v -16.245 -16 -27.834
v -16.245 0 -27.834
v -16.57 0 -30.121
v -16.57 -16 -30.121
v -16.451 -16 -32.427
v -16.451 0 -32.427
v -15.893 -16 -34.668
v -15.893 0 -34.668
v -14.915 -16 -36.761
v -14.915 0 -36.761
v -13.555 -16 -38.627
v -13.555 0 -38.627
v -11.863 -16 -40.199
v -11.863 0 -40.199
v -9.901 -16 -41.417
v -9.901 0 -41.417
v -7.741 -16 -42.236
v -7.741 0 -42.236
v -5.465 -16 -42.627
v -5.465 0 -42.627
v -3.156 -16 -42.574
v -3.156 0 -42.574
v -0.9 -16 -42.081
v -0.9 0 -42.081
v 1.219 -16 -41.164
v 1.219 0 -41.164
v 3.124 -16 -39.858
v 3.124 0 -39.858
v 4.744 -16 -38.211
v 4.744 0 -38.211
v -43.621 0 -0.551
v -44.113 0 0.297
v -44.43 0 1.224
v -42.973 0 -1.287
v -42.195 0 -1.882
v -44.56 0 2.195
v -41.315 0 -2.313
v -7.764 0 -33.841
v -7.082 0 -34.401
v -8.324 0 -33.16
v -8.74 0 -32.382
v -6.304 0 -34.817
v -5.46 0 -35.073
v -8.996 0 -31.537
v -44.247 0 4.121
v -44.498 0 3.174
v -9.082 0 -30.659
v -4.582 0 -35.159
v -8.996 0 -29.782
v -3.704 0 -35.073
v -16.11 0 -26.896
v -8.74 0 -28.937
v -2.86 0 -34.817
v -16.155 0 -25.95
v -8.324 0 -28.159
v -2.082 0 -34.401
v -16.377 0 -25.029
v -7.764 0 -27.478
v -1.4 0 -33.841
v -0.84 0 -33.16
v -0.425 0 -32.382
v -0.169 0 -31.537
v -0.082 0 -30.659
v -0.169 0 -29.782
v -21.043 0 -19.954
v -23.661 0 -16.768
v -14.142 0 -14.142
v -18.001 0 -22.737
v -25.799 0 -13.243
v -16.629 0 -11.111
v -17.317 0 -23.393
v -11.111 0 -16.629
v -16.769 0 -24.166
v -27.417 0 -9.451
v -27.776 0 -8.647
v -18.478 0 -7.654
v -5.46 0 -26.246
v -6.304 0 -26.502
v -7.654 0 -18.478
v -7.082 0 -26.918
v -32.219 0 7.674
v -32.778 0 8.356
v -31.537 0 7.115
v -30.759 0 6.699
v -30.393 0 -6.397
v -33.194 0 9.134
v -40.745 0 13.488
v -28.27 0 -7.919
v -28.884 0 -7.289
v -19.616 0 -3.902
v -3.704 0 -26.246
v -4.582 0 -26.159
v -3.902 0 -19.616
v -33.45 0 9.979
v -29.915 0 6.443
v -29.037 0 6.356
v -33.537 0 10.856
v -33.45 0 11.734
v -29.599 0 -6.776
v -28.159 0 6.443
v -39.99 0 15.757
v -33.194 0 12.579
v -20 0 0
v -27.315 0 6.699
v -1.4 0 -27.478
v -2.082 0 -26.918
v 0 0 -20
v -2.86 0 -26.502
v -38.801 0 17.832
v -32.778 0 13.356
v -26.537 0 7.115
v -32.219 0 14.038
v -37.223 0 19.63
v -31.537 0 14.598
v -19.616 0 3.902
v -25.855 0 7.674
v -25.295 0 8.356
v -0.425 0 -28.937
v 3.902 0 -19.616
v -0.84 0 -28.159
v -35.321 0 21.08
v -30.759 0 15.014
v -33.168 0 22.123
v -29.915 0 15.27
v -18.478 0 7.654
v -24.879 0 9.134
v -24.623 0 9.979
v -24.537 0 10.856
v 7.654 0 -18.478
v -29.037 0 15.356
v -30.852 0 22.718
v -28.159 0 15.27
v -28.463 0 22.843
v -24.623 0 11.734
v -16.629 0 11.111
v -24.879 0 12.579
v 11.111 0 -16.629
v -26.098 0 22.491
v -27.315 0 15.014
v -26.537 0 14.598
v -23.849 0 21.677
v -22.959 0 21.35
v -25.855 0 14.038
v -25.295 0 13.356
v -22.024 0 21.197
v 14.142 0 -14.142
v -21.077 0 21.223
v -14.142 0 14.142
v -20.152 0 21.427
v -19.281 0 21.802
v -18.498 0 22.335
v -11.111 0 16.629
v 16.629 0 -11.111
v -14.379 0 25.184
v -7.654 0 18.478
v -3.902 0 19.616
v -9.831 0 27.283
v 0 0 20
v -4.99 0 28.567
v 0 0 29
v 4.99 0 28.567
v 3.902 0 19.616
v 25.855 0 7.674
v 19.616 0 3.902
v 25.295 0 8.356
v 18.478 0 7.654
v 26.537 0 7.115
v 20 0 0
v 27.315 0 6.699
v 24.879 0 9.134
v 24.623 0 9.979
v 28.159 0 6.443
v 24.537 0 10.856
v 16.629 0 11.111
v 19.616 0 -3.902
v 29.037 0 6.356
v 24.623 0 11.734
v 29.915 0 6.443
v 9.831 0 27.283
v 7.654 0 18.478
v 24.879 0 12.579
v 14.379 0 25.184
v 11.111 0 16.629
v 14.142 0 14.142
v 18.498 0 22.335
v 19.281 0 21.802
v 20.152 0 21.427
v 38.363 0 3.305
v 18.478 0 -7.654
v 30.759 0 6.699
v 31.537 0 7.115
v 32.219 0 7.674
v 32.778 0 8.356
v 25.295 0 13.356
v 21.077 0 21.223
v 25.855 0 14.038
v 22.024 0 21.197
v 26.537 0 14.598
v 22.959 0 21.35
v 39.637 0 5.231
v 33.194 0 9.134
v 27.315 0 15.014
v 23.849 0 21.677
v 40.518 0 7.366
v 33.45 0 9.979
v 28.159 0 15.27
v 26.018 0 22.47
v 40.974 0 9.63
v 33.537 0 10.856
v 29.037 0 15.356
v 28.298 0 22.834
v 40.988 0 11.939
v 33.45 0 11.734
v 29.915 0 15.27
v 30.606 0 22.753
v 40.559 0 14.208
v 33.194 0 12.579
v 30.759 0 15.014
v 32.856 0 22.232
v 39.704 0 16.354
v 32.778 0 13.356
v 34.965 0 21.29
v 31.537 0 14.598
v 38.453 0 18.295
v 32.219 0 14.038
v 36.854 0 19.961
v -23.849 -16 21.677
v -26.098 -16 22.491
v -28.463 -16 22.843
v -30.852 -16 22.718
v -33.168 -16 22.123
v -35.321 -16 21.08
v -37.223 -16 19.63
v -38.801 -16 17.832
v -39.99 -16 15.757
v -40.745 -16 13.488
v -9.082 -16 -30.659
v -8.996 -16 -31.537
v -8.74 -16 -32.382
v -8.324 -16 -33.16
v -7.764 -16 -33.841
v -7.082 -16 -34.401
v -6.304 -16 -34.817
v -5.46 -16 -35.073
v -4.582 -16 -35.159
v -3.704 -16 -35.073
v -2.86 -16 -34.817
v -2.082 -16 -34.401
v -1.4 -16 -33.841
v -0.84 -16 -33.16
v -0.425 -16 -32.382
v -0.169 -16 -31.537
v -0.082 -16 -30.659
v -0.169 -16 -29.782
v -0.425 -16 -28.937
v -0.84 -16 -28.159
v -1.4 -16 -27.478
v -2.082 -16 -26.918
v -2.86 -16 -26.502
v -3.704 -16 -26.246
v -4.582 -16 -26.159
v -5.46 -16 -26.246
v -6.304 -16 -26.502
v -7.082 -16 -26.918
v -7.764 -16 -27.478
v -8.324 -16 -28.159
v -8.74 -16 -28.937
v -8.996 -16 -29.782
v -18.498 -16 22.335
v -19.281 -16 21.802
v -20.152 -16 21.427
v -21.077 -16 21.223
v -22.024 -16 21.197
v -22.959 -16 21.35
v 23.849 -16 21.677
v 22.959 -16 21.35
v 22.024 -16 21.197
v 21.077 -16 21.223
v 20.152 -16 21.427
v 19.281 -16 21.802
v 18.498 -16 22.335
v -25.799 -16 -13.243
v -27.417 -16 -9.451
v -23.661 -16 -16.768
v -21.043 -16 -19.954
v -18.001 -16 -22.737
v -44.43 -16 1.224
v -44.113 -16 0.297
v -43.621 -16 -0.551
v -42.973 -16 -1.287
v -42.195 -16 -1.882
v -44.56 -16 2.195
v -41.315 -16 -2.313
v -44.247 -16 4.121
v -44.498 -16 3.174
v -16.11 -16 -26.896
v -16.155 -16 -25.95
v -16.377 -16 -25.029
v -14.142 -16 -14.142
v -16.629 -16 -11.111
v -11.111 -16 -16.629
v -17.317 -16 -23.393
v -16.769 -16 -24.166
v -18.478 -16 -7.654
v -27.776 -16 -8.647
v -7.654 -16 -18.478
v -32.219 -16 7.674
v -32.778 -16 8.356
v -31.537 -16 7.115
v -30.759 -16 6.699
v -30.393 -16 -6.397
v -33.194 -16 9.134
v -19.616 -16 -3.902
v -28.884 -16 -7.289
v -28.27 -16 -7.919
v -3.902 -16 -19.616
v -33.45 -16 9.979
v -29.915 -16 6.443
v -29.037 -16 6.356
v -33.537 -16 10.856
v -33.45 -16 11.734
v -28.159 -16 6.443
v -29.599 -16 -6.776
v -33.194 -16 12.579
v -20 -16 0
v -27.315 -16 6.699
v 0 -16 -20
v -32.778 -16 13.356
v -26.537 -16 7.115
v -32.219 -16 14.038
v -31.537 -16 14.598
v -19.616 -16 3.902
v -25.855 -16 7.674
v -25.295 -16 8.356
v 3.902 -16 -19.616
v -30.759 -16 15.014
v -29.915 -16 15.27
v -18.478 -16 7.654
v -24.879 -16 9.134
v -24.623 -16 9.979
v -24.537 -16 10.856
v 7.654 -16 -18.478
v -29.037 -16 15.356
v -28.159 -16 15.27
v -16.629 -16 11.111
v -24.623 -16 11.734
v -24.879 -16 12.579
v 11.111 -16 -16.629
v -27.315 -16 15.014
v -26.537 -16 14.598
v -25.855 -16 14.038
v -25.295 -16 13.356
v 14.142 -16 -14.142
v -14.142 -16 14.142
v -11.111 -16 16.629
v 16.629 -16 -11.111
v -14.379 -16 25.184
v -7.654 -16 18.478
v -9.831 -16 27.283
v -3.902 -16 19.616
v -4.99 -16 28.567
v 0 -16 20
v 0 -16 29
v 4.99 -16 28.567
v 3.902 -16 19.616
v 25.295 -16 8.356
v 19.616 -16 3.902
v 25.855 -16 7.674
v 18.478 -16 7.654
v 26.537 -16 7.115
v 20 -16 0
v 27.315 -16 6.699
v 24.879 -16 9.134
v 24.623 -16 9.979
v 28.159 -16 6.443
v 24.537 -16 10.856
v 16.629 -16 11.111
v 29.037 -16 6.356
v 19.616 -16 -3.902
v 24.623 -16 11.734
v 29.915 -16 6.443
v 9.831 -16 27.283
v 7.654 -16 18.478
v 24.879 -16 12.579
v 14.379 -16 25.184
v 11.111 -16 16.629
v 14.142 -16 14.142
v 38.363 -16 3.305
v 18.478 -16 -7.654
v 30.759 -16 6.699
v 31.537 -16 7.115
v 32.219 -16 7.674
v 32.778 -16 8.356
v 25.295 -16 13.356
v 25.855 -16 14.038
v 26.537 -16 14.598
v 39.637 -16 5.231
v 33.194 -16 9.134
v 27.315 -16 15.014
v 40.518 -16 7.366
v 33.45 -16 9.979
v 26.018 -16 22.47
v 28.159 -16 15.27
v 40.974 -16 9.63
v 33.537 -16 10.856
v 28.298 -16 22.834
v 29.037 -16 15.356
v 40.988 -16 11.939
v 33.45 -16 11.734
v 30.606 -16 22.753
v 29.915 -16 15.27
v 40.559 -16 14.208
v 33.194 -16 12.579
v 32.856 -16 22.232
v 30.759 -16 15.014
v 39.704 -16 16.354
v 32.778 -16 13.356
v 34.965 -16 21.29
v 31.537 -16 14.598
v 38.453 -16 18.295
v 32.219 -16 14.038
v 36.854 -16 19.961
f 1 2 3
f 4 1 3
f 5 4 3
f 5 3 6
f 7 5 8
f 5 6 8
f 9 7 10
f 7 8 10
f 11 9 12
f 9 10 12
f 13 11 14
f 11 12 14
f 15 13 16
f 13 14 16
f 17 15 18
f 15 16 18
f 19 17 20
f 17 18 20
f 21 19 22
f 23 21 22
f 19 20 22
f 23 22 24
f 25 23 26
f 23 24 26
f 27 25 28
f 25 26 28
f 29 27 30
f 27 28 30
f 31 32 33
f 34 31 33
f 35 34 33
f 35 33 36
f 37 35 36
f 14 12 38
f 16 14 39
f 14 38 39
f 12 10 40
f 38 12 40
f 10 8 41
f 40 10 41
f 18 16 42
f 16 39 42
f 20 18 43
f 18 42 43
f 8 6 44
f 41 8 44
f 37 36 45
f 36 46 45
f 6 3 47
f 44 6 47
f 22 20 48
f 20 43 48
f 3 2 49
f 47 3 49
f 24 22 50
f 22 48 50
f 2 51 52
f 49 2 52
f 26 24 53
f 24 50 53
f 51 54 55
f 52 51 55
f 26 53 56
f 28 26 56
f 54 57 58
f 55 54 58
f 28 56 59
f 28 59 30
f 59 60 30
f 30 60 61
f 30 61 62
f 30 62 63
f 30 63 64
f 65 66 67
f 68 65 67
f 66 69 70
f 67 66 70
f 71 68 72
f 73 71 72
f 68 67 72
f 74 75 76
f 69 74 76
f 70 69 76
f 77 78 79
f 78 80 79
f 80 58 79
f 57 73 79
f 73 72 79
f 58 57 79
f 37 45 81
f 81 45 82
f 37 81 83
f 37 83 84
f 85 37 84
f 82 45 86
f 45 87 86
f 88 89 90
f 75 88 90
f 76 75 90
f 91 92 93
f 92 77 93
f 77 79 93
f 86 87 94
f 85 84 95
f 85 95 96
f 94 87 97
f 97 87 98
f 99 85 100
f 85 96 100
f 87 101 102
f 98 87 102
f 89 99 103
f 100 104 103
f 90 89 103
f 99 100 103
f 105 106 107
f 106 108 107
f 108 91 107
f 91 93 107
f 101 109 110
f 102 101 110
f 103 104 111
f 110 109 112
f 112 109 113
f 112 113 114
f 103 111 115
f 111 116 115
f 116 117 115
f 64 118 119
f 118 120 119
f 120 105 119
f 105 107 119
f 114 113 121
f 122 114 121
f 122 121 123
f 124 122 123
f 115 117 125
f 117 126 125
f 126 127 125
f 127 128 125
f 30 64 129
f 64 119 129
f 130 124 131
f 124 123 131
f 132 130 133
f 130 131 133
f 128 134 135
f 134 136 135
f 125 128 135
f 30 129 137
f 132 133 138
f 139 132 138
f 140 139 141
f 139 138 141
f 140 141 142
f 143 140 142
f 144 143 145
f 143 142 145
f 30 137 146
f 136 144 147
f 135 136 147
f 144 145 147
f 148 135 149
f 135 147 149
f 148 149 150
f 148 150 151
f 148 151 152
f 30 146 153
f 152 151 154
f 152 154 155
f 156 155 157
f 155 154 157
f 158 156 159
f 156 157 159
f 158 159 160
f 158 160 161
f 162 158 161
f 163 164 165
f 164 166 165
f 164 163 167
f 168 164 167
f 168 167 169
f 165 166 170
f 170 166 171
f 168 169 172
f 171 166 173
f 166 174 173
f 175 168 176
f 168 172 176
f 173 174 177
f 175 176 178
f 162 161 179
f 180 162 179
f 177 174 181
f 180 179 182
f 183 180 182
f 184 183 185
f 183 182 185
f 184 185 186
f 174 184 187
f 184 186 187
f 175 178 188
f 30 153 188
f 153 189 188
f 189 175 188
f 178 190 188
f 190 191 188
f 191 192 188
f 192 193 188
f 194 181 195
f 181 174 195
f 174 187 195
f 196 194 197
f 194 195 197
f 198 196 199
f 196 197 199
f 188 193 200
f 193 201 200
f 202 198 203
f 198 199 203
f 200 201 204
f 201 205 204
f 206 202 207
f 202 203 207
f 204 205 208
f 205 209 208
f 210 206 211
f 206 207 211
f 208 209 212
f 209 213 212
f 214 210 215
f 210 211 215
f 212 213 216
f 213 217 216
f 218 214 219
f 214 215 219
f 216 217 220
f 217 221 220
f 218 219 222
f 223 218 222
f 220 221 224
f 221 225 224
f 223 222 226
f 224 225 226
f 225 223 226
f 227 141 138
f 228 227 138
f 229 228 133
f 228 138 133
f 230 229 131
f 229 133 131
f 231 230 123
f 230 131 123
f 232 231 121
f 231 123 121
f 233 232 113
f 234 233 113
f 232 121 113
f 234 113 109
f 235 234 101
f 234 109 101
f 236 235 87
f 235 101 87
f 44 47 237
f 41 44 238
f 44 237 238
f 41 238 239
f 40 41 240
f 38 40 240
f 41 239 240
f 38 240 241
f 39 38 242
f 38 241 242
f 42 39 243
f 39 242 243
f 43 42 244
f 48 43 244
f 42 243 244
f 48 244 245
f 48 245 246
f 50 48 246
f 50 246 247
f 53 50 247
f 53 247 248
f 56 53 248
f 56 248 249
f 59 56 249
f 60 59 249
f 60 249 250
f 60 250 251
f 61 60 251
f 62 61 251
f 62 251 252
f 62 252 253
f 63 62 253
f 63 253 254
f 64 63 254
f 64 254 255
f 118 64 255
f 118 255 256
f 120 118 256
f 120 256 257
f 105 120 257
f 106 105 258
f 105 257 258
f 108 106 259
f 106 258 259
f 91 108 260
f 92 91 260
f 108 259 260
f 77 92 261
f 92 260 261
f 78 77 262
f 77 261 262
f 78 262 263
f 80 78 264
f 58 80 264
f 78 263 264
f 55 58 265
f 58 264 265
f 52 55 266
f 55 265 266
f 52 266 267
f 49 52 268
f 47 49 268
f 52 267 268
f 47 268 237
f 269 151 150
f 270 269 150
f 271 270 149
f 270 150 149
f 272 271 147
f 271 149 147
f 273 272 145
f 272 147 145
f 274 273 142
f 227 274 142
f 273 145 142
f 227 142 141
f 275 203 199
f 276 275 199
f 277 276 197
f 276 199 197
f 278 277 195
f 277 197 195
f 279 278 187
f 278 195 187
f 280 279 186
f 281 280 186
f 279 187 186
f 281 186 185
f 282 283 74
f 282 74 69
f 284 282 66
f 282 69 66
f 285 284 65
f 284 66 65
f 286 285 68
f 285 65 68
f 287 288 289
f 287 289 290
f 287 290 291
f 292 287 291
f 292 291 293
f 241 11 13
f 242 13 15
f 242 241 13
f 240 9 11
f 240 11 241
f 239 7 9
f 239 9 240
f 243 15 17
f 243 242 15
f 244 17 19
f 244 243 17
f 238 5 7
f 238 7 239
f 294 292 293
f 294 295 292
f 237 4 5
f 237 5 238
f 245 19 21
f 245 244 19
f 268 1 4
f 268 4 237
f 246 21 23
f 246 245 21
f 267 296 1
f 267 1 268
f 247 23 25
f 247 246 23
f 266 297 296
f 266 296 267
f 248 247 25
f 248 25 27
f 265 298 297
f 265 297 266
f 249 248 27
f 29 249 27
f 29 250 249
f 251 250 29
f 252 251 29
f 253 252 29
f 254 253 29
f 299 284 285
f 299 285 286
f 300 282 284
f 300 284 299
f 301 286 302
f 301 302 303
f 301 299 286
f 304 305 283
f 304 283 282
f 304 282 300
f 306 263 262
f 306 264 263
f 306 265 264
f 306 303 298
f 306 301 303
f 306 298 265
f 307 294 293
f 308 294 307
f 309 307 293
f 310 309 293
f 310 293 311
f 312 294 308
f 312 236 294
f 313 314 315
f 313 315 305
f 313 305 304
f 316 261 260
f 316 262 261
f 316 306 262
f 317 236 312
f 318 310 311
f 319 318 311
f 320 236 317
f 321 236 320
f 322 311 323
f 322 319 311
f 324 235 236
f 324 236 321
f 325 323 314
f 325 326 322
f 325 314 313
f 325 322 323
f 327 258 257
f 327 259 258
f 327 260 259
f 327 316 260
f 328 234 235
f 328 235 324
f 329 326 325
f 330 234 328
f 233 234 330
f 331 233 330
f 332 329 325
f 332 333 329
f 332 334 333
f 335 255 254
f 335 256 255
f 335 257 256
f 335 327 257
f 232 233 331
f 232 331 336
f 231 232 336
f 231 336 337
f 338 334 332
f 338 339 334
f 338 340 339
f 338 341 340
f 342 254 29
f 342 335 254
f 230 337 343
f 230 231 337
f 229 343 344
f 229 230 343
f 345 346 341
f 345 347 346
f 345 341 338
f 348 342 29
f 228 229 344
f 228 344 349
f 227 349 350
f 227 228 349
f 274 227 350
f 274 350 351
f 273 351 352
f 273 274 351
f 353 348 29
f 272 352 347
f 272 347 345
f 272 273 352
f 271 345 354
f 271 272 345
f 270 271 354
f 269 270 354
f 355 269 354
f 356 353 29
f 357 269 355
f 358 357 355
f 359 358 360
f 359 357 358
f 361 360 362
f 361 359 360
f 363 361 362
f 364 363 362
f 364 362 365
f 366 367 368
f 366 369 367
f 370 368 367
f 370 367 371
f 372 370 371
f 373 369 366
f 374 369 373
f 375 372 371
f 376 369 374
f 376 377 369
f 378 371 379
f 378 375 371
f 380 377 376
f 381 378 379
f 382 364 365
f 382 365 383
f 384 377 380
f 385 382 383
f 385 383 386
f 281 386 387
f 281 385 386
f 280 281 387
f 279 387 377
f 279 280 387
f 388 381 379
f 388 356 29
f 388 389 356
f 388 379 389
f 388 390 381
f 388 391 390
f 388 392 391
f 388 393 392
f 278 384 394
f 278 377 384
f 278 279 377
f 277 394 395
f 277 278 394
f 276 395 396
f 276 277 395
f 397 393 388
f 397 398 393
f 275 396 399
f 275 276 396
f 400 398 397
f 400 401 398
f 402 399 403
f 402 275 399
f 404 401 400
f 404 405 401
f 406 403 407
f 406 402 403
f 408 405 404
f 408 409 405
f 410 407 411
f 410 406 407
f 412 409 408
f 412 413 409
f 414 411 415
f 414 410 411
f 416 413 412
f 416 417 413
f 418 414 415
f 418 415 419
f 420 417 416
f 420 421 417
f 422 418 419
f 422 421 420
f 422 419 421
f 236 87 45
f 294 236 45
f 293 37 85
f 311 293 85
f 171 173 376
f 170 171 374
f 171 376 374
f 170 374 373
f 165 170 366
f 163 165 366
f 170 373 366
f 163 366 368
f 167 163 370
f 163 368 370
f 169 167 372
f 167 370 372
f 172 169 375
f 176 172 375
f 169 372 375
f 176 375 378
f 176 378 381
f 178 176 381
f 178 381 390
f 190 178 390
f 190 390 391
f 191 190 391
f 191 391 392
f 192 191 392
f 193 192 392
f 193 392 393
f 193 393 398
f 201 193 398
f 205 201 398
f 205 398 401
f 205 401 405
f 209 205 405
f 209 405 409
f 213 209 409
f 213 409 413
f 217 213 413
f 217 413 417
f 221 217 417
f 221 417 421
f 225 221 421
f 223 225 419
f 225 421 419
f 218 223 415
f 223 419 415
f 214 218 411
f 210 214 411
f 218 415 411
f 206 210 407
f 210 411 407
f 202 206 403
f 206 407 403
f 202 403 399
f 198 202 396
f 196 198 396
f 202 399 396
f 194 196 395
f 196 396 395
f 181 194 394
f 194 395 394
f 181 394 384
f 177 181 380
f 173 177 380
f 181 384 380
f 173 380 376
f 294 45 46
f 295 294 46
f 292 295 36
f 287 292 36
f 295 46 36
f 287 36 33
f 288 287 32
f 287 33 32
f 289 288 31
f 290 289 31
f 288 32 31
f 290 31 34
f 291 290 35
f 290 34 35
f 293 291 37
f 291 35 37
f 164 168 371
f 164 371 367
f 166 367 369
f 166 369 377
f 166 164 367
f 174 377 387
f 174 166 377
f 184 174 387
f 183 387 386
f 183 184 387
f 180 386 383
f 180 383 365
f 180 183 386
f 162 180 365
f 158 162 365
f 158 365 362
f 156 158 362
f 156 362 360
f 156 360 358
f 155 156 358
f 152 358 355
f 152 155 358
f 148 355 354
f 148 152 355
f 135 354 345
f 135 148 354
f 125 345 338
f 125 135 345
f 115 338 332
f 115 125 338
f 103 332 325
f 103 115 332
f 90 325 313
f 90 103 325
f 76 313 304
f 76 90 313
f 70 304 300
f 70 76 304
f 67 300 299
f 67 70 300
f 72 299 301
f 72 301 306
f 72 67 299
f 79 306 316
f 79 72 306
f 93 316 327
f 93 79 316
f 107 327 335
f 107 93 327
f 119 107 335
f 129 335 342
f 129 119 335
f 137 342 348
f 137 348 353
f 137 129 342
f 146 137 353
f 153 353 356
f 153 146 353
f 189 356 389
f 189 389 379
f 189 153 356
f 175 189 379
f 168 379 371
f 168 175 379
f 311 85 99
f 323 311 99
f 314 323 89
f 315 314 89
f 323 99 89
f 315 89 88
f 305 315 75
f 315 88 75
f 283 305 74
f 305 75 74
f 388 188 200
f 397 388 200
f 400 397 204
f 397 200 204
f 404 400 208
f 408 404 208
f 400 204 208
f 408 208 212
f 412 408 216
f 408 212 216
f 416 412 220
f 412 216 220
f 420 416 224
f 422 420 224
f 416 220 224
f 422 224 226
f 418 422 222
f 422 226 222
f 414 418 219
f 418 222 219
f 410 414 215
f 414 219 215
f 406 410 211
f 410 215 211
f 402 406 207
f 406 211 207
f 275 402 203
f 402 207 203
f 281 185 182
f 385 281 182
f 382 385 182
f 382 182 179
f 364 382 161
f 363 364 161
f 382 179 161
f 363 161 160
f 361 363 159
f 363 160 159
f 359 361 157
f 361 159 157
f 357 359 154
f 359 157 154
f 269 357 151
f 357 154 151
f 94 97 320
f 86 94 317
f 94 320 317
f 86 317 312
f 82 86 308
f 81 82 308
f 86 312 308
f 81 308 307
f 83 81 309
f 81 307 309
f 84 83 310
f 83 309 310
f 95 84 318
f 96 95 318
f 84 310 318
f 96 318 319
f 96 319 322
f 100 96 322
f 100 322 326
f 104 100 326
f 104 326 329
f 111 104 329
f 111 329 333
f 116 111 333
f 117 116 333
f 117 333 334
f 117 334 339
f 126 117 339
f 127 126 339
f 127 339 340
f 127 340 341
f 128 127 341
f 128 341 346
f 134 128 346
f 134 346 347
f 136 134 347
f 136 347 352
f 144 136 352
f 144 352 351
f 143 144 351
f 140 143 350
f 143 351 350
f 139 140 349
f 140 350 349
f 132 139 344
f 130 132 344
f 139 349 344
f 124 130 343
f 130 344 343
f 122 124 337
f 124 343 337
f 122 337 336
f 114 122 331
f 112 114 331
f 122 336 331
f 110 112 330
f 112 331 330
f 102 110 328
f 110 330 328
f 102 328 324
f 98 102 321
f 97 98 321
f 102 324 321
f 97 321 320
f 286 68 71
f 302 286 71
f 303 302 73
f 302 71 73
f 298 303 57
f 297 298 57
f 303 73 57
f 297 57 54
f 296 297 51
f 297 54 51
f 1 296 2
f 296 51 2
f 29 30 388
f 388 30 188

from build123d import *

# Parameters (mm, degrees)
F0_R     = 20
F1_DEPTH = 16
F2_D     = 9


with BuildPart() as f1:
    # F0 (on Front) → F1 (new body)
    with BuildSketch(Plane.XZ):
        with BuildLine():
            ThreePointArc((-30.3928510428, -6.3968226045), (-28.562967972, -7.5906259687), (-27.4168456036, -9.4507447933))
            ThreePointArc((-27.4168456036, -9.4507447933), (-23.6605152057, -16.7684233069), (-18.0006967285, -22.7370824269))
            ThreePointArc((-18.0006967285, -22.7370824269), (-16.3768862519, -25.0288069118), (-16.2448023697, -27.8343933793))
            ThreePointArc((-16.2448023697, -27.8343933793), (-9.9005108102, -41.4165554271), (4.7436597925, -38.2113364568))
            Line((4.7436597925, -38.2113364568), (38.3625894042, 3.3045841264))
            ThreePointArc((38.3625894042, 3.3045841264), (38.4530723792, 18.2951469617), (23.8486607741, 21.6769102527))
            ThreePointArc((23.8486607741, 21.6769102527), (21.076921319, 21.222793559), (18.4976673308, 22.3346435682))
            ThreePointArc((18.4976673308, 22.3346435682), (0, 29), (-18.4976673308, 22.3346435682))
            ThreePointArc((-18.4976673308, 22.3346435682), (-21.076921319, 21.222793559), (-23.8486607741, 21.6769102527))
            ThreePointArc((-23.8486607741, 21.6769102527), (-34.2706182279, 21.6549260816), (-40.7447903835, 13.4877493741))
            Line((-40.7447903835, 13.4877493741), (-44.2468641961, 4.1210274816))
            ThreePointArc((-44.2468641961, 4.1210274816), (-44.1133096043, 0.296524362), (-41.3145401562, -2.3133703709))
            Line((-41.3145401562, -2.3133703709), (-30.3928510428, -6.3968226045))
        make_face()
        Circle(F0_R, mode=Mode.SUBTRACT)
    extrude(amount=F1_DEPTH)

    # F2 (through all)
    with Locations(Plane(origin=(0, 0, 0), x_dir=(1, 0, 0), z_dir=(0, 1, 0))):
        with Locations((29.0368378667, -10.856428819), (-29.0368378667, -10.856428819), (-4.582091745, 30.6594917642)):
            Hole(F2_D / 2)


solid = f1.part
